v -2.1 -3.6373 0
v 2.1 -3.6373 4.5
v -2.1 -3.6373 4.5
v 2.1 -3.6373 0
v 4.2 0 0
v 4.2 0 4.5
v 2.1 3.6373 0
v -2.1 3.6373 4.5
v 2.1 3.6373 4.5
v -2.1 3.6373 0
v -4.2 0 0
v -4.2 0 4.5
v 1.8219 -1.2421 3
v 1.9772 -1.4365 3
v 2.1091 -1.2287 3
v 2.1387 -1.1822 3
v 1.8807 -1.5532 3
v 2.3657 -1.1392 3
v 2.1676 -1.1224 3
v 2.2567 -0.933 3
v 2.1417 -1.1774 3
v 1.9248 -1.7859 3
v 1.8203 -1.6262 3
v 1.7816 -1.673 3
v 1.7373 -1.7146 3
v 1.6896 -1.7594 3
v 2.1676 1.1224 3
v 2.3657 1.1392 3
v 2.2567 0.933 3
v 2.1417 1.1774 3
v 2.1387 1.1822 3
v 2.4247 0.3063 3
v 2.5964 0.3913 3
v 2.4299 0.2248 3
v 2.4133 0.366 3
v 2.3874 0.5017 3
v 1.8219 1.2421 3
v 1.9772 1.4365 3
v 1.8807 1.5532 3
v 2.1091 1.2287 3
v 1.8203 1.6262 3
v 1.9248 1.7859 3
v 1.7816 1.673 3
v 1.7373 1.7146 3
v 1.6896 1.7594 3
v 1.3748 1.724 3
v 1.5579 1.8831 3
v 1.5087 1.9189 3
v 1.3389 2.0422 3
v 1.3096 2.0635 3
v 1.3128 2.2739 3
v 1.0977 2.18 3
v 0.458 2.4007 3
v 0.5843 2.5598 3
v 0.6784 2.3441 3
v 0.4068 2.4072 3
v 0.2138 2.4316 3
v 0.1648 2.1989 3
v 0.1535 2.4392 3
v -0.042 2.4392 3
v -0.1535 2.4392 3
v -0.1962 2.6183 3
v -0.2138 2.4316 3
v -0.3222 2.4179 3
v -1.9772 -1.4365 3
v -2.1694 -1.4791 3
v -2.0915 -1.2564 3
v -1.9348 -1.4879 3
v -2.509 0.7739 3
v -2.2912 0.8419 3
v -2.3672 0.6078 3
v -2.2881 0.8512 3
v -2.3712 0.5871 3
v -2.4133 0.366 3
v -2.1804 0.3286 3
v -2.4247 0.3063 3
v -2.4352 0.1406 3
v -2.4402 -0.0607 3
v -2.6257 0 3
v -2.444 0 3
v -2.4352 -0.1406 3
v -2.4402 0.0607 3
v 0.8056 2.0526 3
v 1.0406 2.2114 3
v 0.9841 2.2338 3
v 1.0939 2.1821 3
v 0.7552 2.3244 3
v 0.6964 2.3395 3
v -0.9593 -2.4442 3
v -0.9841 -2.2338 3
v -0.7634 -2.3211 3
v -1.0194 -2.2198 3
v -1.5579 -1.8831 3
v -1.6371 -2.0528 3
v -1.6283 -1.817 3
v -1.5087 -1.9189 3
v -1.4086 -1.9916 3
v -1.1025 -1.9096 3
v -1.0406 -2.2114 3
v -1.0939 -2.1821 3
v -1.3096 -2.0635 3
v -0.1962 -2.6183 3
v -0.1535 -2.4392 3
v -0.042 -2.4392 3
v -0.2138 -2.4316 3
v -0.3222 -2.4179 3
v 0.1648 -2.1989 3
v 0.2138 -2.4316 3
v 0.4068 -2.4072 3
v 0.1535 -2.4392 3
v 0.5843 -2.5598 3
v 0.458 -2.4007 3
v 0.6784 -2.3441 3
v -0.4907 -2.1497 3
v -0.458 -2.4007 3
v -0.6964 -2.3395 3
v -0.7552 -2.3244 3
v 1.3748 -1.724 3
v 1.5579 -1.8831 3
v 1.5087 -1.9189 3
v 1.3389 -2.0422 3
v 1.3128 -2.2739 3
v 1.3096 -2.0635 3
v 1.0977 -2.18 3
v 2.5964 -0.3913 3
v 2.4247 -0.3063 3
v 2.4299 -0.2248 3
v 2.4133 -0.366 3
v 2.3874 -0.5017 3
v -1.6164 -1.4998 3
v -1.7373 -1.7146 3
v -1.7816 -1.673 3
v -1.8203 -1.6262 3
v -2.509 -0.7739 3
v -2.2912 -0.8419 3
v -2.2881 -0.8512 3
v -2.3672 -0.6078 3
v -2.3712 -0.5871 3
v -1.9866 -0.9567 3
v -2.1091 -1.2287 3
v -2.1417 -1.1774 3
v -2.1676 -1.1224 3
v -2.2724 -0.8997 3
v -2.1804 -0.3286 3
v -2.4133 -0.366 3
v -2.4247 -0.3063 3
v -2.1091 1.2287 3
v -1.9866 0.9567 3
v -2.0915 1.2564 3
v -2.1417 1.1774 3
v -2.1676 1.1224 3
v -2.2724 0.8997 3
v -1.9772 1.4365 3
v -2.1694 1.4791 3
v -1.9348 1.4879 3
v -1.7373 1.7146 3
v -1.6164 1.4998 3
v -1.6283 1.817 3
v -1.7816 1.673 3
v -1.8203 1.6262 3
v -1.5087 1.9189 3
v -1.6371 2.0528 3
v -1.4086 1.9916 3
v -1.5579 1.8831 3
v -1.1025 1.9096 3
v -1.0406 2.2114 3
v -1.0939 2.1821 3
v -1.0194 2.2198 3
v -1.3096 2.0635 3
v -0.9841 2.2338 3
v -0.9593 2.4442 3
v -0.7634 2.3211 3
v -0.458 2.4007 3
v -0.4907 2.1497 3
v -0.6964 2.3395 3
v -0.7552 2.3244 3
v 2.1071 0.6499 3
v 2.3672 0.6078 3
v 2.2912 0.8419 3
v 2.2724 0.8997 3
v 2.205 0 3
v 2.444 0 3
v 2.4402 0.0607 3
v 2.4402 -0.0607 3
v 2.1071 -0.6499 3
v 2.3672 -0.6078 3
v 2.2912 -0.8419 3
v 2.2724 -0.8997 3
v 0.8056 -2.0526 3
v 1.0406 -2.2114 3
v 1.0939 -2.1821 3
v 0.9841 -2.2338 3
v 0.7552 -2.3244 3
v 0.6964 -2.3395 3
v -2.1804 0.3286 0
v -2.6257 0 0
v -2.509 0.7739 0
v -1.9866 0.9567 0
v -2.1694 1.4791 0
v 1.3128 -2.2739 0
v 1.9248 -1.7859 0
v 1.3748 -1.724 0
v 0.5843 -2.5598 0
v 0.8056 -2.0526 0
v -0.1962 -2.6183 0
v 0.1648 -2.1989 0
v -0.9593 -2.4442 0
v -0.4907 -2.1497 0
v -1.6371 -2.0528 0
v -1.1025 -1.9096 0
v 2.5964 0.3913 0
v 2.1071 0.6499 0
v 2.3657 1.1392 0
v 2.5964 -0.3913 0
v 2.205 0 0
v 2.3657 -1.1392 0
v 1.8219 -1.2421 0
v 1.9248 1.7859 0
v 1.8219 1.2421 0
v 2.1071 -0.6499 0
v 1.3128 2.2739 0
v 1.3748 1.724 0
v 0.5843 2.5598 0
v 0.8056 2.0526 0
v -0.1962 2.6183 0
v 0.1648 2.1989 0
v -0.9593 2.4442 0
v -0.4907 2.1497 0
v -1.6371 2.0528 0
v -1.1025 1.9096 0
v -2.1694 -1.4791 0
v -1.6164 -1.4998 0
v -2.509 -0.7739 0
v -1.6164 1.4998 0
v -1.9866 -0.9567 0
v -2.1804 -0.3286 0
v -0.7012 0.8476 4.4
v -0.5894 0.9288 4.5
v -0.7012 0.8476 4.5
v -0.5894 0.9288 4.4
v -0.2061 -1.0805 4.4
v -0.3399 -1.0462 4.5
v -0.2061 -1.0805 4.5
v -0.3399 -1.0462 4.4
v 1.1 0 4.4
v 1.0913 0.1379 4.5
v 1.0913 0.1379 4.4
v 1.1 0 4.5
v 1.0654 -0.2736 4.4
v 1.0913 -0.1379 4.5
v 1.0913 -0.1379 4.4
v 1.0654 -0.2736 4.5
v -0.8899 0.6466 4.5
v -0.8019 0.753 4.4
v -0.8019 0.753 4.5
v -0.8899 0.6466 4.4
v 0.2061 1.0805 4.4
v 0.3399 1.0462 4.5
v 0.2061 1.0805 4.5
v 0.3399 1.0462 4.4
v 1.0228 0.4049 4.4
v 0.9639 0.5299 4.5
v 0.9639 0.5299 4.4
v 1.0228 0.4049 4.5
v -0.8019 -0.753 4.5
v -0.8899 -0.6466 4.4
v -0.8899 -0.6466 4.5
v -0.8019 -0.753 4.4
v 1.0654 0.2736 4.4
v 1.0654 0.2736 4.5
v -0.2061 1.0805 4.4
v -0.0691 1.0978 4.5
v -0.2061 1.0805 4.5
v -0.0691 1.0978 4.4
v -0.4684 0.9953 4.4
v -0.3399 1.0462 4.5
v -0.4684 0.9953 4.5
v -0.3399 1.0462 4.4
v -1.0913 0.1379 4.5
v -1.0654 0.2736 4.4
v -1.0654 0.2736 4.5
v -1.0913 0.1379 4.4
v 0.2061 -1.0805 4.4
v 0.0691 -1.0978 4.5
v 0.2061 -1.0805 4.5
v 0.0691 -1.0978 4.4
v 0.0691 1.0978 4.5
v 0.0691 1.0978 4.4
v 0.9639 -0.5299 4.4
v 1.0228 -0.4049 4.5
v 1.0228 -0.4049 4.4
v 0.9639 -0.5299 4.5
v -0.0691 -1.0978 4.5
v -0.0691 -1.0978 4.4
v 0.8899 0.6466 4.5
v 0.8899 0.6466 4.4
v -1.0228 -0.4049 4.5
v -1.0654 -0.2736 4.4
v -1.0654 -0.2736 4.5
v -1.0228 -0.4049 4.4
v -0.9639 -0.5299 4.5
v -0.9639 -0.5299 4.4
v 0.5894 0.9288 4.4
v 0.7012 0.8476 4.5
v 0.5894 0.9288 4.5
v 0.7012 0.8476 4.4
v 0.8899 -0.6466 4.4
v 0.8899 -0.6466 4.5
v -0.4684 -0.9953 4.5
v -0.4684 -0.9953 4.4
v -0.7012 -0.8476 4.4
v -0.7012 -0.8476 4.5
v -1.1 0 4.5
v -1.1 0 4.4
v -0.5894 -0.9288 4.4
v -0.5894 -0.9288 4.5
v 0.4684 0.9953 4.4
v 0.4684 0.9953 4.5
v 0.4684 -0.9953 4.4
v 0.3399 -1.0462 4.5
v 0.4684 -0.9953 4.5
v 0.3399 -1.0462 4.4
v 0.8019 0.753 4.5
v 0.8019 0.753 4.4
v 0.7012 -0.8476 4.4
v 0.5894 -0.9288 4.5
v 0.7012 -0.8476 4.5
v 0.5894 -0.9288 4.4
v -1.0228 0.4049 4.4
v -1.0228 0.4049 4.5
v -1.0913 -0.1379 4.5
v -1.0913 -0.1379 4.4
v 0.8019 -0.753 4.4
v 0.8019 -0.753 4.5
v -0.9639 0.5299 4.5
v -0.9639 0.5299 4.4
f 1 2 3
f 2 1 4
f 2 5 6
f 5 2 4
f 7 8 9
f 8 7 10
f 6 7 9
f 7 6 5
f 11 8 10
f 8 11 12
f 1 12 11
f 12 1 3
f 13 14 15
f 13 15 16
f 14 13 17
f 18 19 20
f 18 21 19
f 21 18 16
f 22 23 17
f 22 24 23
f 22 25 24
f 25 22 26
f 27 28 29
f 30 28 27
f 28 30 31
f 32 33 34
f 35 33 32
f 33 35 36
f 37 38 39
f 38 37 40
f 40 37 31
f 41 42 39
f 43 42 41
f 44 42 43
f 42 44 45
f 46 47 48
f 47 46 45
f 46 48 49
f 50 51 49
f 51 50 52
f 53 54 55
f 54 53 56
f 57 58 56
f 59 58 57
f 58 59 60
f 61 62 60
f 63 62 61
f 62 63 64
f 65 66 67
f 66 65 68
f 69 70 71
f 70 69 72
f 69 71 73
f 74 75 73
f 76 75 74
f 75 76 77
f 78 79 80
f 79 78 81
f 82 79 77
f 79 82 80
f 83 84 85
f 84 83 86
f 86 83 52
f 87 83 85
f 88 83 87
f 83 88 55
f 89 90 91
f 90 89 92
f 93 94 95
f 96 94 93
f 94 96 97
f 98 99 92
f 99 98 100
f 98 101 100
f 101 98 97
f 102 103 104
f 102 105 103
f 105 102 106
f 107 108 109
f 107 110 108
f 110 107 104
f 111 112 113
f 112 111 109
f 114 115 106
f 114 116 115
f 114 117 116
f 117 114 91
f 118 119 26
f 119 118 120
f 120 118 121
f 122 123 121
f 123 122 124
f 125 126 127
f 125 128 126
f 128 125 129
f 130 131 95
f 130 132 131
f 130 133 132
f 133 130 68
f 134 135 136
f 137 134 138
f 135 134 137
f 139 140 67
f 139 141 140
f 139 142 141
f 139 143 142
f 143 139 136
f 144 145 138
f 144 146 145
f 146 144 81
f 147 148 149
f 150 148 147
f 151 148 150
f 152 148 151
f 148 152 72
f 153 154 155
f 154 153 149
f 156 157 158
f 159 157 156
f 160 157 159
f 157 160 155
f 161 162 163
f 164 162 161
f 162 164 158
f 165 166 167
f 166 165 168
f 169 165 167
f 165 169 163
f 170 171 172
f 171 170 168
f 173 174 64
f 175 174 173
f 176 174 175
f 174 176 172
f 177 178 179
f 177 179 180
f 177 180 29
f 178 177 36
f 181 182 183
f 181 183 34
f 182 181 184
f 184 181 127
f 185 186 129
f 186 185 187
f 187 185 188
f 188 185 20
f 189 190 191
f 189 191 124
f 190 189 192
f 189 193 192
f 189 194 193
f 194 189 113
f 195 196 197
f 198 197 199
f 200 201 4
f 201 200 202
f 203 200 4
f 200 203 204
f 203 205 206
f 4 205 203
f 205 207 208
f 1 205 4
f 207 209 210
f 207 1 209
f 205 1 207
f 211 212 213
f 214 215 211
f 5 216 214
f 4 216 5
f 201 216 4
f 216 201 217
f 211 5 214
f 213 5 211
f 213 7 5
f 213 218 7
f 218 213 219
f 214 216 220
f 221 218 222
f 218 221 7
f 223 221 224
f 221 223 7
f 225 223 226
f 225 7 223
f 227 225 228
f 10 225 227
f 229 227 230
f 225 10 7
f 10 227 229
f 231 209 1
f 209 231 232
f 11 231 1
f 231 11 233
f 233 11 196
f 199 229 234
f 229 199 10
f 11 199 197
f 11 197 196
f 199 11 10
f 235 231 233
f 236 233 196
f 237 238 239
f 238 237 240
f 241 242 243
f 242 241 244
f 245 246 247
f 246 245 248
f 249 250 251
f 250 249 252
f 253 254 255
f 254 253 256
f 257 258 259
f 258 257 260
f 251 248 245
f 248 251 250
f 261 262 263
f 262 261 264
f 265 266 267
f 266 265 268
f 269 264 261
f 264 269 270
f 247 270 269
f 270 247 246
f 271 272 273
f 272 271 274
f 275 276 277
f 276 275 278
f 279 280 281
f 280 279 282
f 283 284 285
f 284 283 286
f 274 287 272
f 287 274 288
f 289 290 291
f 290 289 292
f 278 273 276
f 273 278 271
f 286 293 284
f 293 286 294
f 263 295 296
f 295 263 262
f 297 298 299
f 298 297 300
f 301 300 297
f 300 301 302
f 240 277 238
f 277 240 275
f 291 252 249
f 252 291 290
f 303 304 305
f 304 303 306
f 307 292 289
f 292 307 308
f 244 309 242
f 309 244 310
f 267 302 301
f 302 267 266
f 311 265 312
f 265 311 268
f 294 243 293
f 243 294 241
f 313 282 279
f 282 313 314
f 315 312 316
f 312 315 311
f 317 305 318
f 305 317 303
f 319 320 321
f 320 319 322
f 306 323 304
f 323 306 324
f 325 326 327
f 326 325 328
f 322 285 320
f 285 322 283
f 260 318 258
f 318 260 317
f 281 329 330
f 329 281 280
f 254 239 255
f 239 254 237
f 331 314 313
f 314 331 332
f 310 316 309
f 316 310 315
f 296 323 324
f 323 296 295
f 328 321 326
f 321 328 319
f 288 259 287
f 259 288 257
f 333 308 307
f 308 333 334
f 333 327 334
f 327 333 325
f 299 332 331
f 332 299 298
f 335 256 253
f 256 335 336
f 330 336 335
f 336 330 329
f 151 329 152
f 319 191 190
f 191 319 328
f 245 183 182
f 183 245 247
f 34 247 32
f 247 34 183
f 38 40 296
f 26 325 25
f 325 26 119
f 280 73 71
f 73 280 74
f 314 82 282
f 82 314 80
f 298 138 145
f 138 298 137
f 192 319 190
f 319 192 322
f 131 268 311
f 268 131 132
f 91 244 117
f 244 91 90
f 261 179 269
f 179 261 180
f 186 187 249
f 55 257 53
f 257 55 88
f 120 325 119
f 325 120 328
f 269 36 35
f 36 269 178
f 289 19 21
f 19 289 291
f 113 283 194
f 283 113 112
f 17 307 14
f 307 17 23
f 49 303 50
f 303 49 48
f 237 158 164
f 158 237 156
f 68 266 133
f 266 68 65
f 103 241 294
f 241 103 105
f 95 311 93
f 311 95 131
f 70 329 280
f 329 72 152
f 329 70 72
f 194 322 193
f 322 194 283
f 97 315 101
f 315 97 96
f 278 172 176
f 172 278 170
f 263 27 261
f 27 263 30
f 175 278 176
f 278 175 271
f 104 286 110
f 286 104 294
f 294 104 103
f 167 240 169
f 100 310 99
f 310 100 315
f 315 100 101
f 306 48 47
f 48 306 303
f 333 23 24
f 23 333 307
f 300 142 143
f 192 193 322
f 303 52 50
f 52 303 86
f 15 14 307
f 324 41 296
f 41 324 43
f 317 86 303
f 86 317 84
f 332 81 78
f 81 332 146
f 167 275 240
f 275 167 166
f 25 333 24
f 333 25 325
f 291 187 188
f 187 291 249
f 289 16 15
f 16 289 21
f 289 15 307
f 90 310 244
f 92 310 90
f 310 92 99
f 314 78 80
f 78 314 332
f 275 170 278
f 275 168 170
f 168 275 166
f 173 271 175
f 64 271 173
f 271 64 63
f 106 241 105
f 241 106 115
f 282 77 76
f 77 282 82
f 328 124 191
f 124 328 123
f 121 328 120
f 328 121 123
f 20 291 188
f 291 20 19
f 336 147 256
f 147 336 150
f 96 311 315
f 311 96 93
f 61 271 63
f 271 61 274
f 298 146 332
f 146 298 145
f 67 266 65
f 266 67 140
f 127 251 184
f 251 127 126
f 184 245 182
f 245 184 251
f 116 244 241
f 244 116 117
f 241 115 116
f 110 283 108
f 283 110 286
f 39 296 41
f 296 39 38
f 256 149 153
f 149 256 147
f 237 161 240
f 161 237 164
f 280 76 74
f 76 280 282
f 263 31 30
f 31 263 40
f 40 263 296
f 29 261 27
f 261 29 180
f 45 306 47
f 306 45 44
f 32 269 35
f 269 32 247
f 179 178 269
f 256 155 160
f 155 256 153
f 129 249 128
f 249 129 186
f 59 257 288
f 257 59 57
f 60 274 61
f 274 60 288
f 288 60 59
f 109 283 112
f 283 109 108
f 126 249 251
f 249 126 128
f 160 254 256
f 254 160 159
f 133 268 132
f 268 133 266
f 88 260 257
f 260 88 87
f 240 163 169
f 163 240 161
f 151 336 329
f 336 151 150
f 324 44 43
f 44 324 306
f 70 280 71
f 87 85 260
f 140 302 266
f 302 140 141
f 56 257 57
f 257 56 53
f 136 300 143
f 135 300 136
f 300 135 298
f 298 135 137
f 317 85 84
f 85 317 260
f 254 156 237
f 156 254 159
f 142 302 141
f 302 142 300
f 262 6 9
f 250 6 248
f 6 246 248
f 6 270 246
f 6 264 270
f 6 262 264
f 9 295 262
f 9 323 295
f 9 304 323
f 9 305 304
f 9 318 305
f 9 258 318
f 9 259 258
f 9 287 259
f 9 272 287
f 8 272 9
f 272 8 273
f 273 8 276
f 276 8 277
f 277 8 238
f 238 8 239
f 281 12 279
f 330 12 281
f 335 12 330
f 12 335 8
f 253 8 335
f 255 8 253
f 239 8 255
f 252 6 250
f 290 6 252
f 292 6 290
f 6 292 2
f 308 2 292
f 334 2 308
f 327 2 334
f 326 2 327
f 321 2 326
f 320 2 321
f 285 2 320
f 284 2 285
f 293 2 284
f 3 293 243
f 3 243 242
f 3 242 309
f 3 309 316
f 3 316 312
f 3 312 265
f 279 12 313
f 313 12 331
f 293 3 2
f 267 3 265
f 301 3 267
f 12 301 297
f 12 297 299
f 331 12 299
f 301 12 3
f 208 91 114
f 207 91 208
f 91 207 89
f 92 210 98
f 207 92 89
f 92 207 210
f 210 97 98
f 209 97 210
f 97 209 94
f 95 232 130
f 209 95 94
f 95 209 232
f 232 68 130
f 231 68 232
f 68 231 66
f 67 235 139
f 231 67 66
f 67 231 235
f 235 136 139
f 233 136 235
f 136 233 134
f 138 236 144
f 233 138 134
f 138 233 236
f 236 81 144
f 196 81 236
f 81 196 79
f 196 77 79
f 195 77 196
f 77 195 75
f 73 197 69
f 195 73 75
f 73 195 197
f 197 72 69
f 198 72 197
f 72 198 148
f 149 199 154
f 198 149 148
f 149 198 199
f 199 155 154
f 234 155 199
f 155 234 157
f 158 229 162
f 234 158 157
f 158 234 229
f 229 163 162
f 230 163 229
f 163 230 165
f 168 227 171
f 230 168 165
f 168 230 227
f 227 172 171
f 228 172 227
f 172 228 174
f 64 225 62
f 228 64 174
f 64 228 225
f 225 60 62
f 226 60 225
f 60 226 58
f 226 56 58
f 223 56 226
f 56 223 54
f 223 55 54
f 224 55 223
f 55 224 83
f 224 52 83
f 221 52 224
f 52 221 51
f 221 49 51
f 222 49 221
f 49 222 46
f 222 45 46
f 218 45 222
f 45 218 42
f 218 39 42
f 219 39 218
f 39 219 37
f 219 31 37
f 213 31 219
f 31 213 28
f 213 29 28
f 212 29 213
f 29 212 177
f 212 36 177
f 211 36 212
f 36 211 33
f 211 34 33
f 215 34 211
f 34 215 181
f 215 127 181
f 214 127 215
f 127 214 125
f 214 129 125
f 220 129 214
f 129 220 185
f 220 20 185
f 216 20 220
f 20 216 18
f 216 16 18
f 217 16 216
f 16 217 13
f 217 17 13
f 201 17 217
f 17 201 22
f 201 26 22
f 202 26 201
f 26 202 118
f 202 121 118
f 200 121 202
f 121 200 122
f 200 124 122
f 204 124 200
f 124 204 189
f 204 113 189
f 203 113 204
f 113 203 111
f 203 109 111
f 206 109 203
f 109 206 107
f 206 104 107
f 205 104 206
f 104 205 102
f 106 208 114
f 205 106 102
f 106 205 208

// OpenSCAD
/*
Copyright (c) 2017 Paul Austin - SDG

Permission is hereby granted, free of charge, to any person obtaining a copy
of this software and associated documentation files (the "Software"), to deal
in the Software without restriction, including without limitation the rights
to use, copy, modify, merge, publish, distribute, sublicense, and/or sell
copies of the Software, and to permit persons to whom the Software is
furnished to do so, subject to the following conditions:

The above copyright notice and this permission notice shall be included in all
copies or substantial portions of the Software.

THE SOFTWARE IS PROVIDED "AS IS", WITHOUT WARRANTY OF ANY KIND, EXPRESS OR
IMPLIED, INCLUDING BUT NOT LIMITED TO THE WARRANTIES OF MERCHANTABILITY,
FITNESS FOR A PARTICULAR PURPOSE AND NONINFRINGEMENT. IN NO EVENT SHALL THE
AUTHORS OR COPYRIGHT HOLDERS BE LIABLE FOR ANY CLAIM, DAMAGES OR OTHER
LIABILITY, WHETHER IN AN ACTION OF CONTRACT, TORT OR OTHERWISE, ARISING FROM,
OUT OF OR IN CONNECTION WITH THE SOFTWARE OR THE USE OR OTHER DEALINGS IN THE
SOFTWARE.
*/

$fn = 50;

// A spline hub typical of sg90 servos. The number of splines vary some are
// 20 some are 21, diameter varies as well.
module coreHub(splineCount = 20, h = 4.5, splineH = 3, splineD=5.0, d = 8.5) {

    // Approx spline shaft diameters
    // sg90(subMicro) - 5mm
    // micro          - 6mm
    screwFlangeThickness = 3.7;
    screwHeadDiameter = 5;
    screwShaftDiameter = 2.2;
    coreH= h;

    // The main shaft hub
    difference() {
        cylinder($fn = 6, d=d, h=splineH);
        cylinder(d=splineD+0.35, h=splineH);
    }

    // Splines on the inside of the hub
    color("red") linear_extrude(splineH)
    for ( rib = [0:(360/splineCount):360]) {
        // Pivot aroung origin
        rotate([0,0,rib])
        // Move out from origin
        translate([splineD/2+0.2,0,0])
        // Make corner face origin
        rotate([0,0,45])
        // Make a square
        square([0.7,0.7], center = true);
    }

    // Hole for the screw
    color("green") difference() {
        translate([0,0,splineH]) cylinder($fn = 6, d=d,h=(coreH - splineH));
        union() {
            translate([0,0,splineH]) cylinder(d=screwShaftDiameter, h=screwFlangeThickness);
            translate([0,0,splineH+screwFlangeThickness]) cylinder(d=screwHeadDiameter,h=5);
            translate([0,0,1.9]) cylinder(h=2.5, d1 = 7, d2 = screwShaftDiameter);
        }
    }

}

rotate([0,0,0]) coreHub(splineCount = 21, coreH = 10, d = 8.4);
